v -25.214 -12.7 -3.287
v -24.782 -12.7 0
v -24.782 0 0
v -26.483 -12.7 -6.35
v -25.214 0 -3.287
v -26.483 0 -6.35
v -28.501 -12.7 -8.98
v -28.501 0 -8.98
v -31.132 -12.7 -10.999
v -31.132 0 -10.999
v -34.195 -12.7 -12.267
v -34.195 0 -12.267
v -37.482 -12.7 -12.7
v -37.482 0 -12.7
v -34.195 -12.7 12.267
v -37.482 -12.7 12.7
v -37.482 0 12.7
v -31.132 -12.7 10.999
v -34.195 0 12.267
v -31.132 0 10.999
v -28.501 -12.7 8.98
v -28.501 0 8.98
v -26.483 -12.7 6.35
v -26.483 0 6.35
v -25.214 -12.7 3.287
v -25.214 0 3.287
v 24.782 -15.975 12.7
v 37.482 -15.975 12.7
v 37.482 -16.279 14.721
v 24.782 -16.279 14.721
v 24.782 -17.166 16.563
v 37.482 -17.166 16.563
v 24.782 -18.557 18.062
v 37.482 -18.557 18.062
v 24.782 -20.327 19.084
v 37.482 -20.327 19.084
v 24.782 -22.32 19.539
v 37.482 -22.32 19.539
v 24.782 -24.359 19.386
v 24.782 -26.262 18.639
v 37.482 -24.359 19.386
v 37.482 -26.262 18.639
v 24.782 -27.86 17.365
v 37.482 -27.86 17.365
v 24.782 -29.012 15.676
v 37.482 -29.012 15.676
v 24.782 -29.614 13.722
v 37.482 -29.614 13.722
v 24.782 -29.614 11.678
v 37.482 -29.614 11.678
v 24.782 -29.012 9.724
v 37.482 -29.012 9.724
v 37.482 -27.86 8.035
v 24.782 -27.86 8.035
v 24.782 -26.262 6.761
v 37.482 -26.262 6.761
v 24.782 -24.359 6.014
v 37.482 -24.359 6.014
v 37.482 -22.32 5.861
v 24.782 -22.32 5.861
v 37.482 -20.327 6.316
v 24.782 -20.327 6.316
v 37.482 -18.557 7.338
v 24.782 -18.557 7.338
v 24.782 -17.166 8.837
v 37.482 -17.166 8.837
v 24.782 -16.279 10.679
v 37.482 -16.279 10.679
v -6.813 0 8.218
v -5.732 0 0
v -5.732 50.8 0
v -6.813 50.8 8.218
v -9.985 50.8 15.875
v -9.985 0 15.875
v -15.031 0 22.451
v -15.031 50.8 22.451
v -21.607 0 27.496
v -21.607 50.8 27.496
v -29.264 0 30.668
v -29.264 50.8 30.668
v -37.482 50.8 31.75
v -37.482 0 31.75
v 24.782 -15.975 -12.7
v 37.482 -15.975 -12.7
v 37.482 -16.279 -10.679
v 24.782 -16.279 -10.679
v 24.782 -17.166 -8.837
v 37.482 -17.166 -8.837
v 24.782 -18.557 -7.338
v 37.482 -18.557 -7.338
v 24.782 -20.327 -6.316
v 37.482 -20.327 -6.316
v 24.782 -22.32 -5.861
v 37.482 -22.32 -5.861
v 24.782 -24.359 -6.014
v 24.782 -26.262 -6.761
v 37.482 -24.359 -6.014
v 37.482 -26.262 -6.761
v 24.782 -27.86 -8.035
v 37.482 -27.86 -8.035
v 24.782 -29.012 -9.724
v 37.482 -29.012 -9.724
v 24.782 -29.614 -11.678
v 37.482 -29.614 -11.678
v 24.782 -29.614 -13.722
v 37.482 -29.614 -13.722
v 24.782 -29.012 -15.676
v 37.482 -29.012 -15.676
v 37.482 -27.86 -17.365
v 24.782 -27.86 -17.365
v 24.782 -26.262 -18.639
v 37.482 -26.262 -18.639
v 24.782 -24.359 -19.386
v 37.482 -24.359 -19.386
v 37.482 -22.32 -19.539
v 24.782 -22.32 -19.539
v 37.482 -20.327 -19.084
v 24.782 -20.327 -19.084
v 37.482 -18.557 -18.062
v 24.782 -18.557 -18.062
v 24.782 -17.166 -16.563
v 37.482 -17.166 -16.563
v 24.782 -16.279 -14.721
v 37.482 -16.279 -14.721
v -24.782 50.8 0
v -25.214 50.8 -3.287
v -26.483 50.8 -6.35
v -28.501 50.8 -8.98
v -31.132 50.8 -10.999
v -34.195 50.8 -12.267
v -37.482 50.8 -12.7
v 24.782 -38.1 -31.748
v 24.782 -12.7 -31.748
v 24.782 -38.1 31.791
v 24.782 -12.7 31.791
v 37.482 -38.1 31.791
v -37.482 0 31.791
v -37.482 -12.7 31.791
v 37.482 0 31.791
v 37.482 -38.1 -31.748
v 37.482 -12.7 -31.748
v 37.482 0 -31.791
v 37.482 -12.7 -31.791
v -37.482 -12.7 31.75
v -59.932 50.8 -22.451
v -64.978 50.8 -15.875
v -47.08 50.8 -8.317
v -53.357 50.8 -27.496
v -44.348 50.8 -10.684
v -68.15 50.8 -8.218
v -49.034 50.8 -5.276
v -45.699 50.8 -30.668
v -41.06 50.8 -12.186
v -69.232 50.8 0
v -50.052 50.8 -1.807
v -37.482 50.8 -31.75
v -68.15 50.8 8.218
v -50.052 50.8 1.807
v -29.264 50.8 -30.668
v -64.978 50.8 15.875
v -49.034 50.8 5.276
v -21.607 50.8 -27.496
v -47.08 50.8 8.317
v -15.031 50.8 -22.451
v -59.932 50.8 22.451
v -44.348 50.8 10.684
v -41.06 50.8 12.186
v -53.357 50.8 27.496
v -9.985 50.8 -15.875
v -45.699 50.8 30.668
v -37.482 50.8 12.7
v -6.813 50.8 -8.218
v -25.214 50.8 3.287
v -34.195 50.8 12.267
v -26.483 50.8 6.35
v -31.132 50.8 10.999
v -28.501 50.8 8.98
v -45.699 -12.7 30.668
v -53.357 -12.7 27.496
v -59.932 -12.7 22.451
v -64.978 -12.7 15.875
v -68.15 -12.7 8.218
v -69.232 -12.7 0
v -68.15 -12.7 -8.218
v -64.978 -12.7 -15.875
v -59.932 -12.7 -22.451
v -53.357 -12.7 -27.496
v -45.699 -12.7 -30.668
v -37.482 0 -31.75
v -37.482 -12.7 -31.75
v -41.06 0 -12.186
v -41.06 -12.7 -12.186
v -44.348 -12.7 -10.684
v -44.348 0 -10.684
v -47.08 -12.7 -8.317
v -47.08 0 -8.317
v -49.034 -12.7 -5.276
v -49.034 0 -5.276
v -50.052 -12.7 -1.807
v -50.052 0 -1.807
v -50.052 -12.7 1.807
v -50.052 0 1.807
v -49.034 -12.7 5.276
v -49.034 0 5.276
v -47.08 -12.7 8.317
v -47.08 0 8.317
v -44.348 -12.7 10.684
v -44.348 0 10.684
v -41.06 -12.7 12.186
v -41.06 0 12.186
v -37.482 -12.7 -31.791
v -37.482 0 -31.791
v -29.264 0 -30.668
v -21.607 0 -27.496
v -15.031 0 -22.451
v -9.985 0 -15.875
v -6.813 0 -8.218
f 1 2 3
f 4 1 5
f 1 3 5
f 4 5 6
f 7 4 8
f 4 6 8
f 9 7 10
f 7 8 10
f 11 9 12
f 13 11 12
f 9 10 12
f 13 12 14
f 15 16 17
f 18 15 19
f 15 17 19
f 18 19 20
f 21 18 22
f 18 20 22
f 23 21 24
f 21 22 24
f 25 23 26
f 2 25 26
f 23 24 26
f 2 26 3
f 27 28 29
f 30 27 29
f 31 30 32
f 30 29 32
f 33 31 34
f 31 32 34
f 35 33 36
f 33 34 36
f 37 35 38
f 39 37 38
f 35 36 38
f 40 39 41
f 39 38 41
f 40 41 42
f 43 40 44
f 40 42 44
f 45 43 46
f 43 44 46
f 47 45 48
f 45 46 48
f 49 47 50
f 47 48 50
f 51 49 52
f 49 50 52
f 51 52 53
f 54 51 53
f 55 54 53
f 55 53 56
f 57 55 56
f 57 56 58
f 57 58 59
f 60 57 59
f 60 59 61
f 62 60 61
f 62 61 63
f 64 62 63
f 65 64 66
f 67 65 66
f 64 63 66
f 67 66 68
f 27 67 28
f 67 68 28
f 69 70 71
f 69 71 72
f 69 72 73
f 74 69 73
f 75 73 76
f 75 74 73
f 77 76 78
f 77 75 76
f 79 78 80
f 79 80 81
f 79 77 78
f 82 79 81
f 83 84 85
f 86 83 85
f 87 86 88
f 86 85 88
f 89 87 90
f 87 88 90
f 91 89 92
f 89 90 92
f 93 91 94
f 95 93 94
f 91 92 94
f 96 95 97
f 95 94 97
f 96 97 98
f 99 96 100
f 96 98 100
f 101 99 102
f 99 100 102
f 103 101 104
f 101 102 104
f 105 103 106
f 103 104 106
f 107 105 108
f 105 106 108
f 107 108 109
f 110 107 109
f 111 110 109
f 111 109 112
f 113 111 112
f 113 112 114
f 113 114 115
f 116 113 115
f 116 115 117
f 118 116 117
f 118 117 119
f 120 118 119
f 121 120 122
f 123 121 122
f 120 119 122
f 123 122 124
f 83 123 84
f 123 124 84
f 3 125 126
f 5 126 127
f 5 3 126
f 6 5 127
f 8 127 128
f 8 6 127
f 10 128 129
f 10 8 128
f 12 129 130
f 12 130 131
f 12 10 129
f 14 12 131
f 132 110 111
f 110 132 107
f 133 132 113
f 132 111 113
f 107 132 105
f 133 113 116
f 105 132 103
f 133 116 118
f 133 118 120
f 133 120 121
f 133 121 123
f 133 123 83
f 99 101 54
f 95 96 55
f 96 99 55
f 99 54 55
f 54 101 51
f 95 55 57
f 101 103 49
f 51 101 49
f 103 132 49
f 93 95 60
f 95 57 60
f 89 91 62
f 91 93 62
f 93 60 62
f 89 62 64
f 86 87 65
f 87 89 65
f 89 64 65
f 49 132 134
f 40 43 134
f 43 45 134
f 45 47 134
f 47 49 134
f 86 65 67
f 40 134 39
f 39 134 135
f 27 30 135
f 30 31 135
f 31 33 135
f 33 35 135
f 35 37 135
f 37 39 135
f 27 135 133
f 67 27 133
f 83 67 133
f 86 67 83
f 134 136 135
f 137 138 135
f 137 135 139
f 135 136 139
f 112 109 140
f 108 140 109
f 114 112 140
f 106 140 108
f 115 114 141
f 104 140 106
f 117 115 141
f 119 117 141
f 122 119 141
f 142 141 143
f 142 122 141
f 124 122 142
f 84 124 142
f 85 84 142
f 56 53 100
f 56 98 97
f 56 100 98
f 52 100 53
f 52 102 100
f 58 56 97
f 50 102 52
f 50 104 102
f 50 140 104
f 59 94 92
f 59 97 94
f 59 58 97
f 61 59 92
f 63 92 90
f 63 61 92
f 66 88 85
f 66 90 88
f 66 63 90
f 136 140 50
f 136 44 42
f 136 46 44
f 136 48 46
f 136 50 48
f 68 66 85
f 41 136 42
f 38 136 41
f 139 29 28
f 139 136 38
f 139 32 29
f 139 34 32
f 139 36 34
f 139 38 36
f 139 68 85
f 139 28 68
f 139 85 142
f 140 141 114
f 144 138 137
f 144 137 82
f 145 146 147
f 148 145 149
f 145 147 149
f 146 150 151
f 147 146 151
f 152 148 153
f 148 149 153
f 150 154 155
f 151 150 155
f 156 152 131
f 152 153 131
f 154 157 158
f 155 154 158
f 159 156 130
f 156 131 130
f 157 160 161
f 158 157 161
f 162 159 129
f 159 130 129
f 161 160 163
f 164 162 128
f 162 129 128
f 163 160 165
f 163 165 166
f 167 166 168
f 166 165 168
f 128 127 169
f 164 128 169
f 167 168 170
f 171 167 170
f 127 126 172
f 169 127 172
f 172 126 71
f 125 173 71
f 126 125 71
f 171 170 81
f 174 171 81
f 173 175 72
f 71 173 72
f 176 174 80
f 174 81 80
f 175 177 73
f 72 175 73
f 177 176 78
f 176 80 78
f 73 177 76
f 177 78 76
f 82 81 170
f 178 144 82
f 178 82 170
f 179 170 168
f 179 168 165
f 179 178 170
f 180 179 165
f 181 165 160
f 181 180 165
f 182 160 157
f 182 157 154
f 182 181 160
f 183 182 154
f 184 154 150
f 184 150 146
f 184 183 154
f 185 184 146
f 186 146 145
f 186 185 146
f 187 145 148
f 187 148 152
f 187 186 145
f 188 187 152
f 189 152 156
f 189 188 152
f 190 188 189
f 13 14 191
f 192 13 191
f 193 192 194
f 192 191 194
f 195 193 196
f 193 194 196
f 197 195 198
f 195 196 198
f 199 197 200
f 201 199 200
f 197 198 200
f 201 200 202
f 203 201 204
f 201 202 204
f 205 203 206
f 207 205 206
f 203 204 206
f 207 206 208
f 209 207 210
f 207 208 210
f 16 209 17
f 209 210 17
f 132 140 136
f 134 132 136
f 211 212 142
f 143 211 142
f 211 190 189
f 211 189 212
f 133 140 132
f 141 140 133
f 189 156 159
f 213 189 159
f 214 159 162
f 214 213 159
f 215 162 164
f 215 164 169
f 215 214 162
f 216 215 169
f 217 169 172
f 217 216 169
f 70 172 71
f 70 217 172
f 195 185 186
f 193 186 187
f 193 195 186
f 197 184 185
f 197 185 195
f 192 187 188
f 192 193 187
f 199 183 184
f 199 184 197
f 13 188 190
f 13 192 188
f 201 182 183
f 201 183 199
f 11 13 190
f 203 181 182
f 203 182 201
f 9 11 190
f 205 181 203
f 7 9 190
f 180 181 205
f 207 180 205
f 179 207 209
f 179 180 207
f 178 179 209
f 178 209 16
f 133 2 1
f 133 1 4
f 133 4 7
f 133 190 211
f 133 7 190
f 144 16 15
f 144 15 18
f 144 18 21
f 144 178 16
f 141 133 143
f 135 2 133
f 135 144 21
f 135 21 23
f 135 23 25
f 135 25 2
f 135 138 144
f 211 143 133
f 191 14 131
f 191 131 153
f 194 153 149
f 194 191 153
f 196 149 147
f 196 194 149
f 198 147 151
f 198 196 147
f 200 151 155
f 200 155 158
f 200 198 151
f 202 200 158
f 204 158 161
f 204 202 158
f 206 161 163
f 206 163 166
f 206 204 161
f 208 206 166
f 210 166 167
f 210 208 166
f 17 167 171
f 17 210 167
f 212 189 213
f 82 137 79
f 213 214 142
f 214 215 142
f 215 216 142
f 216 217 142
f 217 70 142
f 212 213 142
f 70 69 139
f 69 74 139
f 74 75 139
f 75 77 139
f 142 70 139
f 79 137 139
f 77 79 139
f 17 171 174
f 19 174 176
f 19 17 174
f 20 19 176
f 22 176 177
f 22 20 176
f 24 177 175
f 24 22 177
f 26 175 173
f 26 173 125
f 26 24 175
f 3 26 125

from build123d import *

# Parameters (mm, degrees)
F1_DEPTH = 12.7
F2_DEPTH = 50.8
F3_W     = 25.4
F3_H     = 63.538220574
F3_R     = 6.858
F4_DEPTH = 12.7


with BuildPart() as f1:
    # F0 (on Front) → F1 (new body)
    with BuildSketch(Plane.XZ):
        with BuildLine():
            ThreePointArc((-37.4815943599, 31.75), (-69.2315943599, 0), (-37.4815943599, -31.75))
            Line((-37.4815943599, -31.75), (-37.4815943599, -12.7))
            ThreePointArc((-37.4815943599, -12.7), (-50.1815943599, 0), (-37.4815943599, 12.7))
            Line((-37.4815943599, 12.7), (-37.4815943599, 31.75))
        make_face()
        with BuildLine():
            Line((-37.4815943599, -12.7), (-37.4815943599, -31.75))
            ThreePointArc((-37.4815943599, -31.75), (-15.0309540572, -22.4506403027), (-5.7315943599, 0))
            ThreePointArc((-5.7315943599, 0), (-15.0309540572, 22.4506403027), (-37.4815943599, 31.75))
            Line((-37.4815943599, 31.75), (-37.4815943599, 12.7))
            ThreePointArc((-37.4815943599, 12.7), (-28.5013382388, 8.9802561211), (-24.7815943599, 0))
            ThreePointArc((-24.7815943599, 0), (-28.5013382388, -8.9802561211), (-37.4815943599, -12.7))
        make_face()
        with BuildLine():
            Line((-37.4815943599, -31.75), (-37.4815943599, -31.7906037465))
            Line((-37.4815943599, -31.7906037465), (37.4815943599, -31.7906037465))
            Line((37.4815943599, -31.7906037465), (37.4815943599, 31.7906037465))
            Line((37.4815943599, 31.7906037465), (-37.4815943599, 31.7906037465))
            Line((-37.4815943599, 31.7906037465), (-37.4815943599, 31.75))
            ThreePointArc((-37.4815943599, 31.75), (-15.0309540572, 22.4506403027), (-5.7315943599, 0))
            ThreePointArc((-5.7315943599, 0), (-15.0309540572, -22.4506403027), (-37.4815943599, -31.75))
        make_face()
    extrude(amount=F1_DEPTH)

    # F0 (on Front) → F2 (join)
    with BuildSketch(Plane.XZ):
        with BuildLine():
            Line((-37.4815943599, -12.7), (-37.4815943599, -31.75))
            ThreePointArc((-37.4815943599, -31.75), (-15.0309540572, -22.4506403027), (-5.7315943599, 0))
            ThreePointArc((-5.7315943599, 0), (-15.0309540572, 22.4506403027), (-37.4815943599, 31.75))
            Line((-37.4815943599, 31.75), (-37.4815943599, 12.7))
            ThreePointArc((-37.4815943599, 12.7), (-28.5013382388, 8.9802561211), (-24.7815943599, 0))
            ThreePointArc((-24.7815943599, 0), (-28.5013382388, -8.9802561211), (-37.4815943599, -12.7))
        make_face()
        with BuildLine():
            ThreePointArc((-37.4815943599, 31.75), (-69.2315943599, 0), (-37.4815943599, -31.75))
            Line((-37.4815943599, -31.75), (-37.4815943599, -12.7))
            ThreePointArc((-37.4815943599, -12.7), (-50.1815943599, 0), (-37.4815943599, 12.7))
            Line((-37.4815943599, 12.7), (-37.4815943599, 31.75))
        make_face()
    extrude(amount=-F2_DEPTH)

    # F3 (on face) → F4 (join)
    with BuildSketch(Plane.YZ.offset(37.4815943599)):
        with Locations((-25.4, 0.0214934595)):
            Rectangle(F3_W, F3_H)
        with Locations((-22.8328048199, -12.7)):
            Circle(F3_R, mode=Mode.SUBTRACT)
        with Locations((-22.8328048199, 12.7)):
            Circle(F3_R, mode=Mode.SUBTRACT)
    extrude(amount=-F4_DEPTH)


solid = f1.part
